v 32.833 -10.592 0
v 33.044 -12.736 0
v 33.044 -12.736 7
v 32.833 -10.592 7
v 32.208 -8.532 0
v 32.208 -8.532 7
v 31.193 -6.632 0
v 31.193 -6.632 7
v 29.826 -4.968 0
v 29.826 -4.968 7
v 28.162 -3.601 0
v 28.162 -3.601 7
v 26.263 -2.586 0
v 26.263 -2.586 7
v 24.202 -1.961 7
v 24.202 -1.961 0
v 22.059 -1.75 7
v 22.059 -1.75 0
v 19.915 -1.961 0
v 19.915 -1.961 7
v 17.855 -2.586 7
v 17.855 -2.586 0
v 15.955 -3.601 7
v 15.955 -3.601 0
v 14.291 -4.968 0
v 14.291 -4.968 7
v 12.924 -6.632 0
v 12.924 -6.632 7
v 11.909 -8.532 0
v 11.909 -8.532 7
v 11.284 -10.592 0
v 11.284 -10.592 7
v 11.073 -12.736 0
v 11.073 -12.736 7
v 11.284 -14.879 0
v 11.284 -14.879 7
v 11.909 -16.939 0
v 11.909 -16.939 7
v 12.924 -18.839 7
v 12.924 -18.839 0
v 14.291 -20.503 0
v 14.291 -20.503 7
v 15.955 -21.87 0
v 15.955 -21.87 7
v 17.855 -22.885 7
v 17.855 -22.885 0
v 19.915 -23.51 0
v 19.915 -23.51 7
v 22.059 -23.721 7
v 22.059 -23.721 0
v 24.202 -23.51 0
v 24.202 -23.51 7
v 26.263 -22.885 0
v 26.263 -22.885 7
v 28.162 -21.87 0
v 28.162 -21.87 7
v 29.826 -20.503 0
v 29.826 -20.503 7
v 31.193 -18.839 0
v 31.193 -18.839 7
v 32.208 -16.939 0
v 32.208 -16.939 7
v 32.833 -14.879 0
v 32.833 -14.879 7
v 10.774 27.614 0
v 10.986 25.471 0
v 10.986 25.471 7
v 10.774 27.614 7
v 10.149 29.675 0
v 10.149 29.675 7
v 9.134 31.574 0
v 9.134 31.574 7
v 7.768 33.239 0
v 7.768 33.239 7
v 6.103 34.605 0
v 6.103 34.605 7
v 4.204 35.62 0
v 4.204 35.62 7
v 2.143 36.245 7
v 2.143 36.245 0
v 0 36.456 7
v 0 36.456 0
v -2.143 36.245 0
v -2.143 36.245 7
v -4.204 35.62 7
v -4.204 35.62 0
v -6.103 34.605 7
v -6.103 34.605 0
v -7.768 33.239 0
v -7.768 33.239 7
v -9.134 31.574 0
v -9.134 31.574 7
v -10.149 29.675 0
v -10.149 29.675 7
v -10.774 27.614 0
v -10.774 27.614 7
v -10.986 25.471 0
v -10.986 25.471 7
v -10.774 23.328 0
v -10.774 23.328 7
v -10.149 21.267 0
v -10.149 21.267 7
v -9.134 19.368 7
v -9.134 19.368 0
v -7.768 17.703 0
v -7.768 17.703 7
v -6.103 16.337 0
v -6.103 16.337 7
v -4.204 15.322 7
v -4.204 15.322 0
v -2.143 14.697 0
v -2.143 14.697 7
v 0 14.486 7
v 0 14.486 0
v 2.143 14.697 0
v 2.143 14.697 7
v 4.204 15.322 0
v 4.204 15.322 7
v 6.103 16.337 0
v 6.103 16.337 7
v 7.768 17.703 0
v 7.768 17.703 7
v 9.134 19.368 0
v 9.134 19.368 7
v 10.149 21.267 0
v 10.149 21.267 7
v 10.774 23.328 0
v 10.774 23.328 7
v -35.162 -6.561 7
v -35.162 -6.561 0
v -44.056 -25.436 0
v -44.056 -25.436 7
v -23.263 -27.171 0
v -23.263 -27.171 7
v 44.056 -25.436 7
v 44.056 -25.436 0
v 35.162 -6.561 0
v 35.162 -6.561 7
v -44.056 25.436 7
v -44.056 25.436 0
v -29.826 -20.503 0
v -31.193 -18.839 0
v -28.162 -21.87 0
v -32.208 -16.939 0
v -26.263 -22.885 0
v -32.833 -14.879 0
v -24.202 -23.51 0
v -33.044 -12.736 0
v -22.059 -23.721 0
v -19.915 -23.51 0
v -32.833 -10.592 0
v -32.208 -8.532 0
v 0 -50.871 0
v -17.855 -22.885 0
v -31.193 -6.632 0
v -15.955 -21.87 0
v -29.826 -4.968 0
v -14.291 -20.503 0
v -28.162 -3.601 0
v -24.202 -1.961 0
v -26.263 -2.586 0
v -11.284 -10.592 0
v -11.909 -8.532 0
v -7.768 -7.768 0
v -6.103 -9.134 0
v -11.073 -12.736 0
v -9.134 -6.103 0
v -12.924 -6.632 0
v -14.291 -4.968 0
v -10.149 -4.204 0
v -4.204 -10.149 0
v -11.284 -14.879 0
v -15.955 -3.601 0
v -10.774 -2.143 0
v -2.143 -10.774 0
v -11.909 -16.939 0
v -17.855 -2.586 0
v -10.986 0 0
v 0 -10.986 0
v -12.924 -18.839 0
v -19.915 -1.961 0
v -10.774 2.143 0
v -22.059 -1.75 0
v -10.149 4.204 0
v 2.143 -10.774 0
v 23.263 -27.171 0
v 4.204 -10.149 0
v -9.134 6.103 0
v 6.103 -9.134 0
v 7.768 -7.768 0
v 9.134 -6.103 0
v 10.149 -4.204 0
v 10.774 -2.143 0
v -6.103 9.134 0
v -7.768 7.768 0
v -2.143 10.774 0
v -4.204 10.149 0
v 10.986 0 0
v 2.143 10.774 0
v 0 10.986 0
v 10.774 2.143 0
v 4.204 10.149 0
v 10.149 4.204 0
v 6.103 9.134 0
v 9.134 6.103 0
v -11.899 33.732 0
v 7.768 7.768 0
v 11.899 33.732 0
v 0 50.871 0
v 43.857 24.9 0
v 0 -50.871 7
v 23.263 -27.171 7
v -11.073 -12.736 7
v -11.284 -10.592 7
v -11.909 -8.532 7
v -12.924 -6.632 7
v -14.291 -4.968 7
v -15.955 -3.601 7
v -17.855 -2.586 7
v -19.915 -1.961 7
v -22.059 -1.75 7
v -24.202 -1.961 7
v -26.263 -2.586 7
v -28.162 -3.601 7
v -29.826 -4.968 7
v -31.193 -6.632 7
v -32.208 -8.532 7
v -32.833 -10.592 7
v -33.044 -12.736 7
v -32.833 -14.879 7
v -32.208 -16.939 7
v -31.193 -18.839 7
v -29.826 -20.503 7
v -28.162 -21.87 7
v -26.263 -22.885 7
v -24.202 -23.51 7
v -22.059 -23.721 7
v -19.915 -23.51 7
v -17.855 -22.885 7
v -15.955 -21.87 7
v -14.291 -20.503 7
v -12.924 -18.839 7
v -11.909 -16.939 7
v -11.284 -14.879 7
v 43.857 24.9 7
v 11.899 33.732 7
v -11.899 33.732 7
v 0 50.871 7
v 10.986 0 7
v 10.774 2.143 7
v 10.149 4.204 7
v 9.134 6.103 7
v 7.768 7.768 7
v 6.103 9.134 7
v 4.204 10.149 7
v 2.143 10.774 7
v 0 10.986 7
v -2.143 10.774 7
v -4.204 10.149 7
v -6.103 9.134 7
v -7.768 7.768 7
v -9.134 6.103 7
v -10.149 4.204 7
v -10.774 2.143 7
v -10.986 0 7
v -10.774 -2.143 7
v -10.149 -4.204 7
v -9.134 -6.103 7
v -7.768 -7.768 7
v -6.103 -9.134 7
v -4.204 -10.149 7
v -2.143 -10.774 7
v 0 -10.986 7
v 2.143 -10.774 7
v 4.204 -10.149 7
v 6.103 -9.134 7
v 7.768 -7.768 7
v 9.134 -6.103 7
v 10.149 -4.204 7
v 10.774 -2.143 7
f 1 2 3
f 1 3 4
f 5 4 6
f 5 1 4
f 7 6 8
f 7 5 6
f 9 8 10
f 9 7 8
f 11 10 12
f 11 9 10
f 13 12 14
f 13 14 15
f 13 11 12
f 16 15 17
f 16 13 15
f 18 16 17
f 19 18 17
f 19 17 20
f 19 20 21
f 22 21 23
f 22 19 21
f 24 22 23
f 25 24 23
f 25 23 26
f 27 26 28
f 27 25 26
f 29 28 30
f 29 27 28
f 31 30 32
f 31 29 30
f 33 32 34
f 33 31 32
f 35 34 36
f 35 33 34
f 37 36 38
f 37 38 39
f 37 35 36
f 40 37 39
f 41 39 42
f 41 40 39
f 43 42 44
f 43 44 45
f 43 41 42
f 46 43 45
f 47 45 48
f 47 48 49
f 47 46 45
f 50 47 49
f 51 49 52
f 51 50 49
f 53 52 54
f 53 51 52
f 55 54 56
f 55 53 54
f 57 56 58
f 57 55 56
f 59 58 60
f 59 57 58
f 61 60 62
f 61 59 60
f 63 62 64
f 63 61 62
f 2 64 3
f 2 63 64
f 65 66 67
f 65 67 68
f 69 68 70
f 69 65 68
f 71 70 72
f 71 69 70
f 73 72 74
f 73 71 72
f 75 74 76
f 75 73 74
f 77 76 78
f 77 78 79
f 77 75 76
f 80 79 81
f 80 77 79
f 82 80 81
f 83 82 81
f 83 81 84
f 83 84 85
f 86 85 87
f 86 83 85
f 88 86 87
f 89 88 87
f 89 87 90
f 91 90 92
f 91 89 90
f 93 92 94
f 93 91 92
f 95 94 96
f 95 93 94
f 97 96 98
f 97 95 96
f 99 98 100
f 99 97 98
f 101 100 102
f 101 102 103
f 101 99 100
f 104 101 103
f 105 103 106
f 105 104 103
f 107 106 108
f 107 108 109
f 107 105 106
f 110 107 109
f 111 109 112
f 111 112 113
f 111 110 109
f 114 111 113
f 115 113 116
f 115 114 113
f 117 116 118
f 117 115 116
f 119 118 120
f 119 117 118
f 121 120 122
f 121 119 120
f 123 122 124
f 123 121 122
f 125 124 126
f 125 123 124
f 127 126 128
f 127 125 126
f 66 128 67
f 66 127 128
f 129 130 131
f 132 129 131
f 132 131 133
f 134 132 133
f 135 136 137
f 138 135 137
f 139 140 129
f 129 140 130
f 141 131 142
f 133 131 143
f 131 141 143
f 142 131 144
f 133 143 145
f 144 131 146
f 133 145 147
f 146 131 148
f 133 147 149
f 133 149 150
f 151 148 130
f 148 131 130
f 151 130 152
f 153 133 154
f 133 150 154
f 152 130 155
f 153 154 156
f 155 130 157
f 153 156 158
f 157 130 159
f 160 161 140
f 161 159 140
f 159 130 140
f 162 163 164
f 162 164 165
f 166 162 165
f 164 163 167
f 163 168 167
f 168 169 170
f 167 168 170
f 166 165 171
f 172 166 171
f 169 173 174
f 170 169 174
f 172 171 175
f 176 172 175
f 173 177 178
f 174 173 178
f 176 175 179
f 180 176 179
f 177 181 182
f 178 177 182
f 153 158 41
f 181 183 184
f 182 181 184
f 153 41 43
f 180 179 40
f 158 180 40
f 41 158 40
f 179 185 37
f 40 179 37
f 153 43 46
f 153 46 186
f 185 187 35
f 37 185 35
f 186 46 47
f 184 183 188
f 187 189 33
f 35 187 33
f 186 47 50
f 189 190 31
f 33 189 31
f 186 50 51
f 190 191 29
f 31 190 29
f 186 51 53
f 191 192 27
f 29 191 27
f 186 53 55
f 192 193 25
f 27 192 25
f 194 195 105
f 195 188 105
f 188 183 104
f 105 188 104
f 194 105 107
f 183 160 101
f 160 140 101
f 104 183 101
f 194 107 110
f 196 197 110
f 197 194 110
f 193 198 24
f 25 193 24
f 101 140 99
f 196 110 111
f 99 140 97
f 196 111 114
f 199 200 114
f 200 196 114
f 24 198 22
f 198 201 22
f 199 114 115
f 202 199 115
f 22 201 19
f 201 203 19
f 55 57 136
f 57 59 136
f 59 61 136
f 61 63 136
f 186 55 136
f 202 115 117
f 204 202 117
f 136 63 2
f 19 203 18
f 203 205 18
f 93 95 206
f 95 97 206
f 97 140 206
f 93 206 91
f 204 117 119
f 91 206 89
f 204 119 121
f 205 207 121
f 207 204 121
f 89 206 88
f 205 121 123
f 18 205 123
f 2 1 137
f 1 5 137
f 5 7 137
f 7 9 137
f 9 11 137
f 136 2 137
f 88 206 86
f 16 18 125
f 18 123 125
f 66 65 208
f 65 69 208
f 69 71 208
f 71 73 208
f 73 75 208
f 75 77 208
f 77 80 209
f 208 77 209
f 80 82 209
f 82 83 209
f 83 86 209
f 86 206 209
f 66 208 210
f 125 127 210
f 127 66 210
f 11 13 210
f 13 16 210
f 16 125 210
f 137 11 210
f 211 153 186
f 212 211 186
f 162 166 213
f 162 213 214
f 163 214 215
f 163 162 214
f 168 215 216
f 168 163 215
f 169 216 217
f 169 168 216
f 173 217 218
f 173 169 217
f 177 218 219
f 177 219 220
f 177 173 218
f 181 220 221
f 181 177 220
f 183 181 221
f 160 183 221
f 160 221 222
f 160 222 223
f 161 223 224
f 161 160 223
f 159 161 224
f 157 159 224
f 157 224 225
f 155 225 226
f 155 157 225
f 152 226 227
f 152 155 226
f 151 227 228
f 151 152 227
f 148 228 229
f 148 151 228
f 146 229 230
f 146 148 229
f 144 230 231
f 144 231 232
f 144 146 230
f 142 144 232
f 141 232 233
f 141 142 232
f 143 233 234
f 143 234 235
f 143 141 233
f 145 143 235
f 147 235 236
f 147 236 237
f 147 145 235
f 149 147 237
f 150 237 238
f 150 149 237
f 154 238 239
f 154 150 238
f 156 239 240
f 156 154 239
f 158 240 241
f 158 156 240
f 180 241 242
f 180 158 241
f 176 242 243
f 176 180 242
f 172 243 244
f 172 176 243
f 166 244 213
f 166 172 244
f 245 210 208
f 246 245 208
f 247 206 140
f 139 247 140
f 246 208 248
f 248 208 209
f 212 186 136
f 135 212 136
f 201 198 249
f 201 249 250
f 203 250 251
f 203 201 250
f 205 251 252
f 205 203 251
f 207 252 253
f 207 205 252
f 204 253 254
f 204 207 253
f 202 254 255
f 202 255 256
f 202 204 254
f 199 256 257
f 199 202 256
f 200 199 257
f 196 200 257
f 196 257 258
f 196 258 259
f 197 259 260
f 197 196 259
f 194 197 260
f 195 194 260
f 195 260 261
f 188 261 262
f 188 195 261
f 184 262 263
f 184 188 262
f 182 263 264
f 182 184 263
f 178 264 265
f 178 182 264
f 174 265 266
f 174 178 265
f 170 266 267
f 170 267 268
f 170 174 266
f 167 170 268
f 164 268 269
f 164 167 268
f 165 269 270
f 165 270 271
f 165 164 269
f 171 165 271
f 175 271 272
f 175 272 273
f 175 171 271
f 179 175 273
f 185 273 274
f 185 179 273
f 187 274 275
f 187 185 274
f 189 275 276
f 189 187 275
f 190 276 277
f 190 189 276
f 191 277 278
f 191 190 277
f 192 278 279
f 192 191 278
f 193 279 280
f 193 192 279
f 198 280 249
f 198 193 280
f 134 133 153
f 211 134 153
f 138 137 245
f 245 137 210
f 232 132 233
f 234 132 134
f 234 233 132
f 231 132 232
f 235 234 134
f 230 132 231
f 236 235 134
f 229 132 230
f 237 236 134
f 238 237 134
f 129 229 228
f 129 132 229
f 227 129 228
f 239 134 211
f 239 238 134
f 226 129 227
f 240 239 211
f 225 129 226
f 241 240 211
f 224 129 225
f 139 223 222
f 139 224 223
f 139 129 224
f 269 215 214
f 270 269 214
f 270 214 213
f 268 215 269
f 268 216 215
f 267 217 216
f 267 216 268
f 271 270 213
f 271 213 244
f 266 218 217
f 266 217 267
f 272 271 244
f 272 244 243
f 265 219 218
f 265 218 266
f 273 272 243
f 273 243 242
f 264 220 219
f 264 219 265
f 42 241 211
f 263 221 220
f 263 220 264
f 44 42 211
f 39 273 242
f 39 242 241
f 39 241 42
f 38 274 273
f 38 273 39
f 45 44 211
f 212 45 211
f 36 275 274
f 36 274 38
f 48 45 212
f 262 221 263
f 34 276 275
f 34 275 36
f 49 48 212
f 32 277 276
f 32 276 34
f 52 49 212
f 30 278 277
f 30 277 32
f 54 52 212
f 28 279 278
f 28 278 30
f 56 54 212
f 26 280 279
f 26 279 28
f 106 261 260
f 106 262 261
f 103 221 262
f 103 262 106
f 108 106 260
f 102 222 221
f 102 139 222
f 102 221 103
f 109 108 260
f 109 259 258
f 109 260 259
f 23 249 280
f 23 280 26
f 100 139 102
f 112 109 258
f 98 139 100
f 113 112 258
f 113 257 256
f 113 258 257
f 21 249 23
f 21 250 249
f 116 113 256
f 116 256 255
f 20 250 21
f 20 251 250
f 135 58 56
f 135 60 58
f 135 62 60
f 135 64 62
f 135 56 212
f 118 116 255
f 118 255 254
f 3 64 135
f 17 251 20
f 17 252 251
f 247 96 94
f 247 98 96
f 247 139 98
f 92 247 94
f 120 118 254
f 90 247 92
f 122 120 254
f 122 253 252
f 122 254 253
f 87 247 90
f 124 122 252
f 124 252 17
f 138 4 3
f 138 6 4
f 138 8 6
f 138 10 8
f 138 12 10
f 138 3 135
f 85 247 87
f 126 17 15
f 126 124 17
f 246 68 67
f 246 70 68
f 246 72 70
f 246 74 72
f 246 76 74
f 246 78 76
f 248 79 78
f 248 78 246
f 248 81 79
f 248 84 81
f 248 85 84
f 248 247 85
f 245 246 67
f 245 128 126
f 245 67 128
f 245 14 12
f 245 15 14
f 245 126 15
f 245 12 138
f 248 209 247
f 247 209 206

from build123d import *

# Parameters (mm, degrees)
F1_R     = 10.9855
F2_DEPTH = 7


with BuildPart() as f2:
    # F1 (on Top) → F2 (new body)
    with BuildSketch(Plane.XY):
        Polygon((43.857164, 24.899659), (11.898966, 33.732012), (0, 50.871), (-11.898966, 33.732012), (-44.055578, 25.4355), (-35.162262, -6.561199), (-44.055578, -25.4355), (-23.263297, -27.170813), (0, -50.871), (23.263297, -27.170813), (44.055578, -25.4355), (35.162262, -6.561199), align=None)
        with Locations((-22.058533, -12.7355)):
            Circle(F1_R, mode=Mode.SUBTRACT)
        with Locations((22.058533, -12.7355)):
            Circle(F1_R, mode=Mode.SUBTRACT)
        Circle(F1_R, mode=Mode.SUBTRACT)
        with Locations((0, 25.471)):
            Circle(F1_R, mode=Mode.SUBTRACT)
    extrude(amount=F2_DEPTH)


solid = f2.part
